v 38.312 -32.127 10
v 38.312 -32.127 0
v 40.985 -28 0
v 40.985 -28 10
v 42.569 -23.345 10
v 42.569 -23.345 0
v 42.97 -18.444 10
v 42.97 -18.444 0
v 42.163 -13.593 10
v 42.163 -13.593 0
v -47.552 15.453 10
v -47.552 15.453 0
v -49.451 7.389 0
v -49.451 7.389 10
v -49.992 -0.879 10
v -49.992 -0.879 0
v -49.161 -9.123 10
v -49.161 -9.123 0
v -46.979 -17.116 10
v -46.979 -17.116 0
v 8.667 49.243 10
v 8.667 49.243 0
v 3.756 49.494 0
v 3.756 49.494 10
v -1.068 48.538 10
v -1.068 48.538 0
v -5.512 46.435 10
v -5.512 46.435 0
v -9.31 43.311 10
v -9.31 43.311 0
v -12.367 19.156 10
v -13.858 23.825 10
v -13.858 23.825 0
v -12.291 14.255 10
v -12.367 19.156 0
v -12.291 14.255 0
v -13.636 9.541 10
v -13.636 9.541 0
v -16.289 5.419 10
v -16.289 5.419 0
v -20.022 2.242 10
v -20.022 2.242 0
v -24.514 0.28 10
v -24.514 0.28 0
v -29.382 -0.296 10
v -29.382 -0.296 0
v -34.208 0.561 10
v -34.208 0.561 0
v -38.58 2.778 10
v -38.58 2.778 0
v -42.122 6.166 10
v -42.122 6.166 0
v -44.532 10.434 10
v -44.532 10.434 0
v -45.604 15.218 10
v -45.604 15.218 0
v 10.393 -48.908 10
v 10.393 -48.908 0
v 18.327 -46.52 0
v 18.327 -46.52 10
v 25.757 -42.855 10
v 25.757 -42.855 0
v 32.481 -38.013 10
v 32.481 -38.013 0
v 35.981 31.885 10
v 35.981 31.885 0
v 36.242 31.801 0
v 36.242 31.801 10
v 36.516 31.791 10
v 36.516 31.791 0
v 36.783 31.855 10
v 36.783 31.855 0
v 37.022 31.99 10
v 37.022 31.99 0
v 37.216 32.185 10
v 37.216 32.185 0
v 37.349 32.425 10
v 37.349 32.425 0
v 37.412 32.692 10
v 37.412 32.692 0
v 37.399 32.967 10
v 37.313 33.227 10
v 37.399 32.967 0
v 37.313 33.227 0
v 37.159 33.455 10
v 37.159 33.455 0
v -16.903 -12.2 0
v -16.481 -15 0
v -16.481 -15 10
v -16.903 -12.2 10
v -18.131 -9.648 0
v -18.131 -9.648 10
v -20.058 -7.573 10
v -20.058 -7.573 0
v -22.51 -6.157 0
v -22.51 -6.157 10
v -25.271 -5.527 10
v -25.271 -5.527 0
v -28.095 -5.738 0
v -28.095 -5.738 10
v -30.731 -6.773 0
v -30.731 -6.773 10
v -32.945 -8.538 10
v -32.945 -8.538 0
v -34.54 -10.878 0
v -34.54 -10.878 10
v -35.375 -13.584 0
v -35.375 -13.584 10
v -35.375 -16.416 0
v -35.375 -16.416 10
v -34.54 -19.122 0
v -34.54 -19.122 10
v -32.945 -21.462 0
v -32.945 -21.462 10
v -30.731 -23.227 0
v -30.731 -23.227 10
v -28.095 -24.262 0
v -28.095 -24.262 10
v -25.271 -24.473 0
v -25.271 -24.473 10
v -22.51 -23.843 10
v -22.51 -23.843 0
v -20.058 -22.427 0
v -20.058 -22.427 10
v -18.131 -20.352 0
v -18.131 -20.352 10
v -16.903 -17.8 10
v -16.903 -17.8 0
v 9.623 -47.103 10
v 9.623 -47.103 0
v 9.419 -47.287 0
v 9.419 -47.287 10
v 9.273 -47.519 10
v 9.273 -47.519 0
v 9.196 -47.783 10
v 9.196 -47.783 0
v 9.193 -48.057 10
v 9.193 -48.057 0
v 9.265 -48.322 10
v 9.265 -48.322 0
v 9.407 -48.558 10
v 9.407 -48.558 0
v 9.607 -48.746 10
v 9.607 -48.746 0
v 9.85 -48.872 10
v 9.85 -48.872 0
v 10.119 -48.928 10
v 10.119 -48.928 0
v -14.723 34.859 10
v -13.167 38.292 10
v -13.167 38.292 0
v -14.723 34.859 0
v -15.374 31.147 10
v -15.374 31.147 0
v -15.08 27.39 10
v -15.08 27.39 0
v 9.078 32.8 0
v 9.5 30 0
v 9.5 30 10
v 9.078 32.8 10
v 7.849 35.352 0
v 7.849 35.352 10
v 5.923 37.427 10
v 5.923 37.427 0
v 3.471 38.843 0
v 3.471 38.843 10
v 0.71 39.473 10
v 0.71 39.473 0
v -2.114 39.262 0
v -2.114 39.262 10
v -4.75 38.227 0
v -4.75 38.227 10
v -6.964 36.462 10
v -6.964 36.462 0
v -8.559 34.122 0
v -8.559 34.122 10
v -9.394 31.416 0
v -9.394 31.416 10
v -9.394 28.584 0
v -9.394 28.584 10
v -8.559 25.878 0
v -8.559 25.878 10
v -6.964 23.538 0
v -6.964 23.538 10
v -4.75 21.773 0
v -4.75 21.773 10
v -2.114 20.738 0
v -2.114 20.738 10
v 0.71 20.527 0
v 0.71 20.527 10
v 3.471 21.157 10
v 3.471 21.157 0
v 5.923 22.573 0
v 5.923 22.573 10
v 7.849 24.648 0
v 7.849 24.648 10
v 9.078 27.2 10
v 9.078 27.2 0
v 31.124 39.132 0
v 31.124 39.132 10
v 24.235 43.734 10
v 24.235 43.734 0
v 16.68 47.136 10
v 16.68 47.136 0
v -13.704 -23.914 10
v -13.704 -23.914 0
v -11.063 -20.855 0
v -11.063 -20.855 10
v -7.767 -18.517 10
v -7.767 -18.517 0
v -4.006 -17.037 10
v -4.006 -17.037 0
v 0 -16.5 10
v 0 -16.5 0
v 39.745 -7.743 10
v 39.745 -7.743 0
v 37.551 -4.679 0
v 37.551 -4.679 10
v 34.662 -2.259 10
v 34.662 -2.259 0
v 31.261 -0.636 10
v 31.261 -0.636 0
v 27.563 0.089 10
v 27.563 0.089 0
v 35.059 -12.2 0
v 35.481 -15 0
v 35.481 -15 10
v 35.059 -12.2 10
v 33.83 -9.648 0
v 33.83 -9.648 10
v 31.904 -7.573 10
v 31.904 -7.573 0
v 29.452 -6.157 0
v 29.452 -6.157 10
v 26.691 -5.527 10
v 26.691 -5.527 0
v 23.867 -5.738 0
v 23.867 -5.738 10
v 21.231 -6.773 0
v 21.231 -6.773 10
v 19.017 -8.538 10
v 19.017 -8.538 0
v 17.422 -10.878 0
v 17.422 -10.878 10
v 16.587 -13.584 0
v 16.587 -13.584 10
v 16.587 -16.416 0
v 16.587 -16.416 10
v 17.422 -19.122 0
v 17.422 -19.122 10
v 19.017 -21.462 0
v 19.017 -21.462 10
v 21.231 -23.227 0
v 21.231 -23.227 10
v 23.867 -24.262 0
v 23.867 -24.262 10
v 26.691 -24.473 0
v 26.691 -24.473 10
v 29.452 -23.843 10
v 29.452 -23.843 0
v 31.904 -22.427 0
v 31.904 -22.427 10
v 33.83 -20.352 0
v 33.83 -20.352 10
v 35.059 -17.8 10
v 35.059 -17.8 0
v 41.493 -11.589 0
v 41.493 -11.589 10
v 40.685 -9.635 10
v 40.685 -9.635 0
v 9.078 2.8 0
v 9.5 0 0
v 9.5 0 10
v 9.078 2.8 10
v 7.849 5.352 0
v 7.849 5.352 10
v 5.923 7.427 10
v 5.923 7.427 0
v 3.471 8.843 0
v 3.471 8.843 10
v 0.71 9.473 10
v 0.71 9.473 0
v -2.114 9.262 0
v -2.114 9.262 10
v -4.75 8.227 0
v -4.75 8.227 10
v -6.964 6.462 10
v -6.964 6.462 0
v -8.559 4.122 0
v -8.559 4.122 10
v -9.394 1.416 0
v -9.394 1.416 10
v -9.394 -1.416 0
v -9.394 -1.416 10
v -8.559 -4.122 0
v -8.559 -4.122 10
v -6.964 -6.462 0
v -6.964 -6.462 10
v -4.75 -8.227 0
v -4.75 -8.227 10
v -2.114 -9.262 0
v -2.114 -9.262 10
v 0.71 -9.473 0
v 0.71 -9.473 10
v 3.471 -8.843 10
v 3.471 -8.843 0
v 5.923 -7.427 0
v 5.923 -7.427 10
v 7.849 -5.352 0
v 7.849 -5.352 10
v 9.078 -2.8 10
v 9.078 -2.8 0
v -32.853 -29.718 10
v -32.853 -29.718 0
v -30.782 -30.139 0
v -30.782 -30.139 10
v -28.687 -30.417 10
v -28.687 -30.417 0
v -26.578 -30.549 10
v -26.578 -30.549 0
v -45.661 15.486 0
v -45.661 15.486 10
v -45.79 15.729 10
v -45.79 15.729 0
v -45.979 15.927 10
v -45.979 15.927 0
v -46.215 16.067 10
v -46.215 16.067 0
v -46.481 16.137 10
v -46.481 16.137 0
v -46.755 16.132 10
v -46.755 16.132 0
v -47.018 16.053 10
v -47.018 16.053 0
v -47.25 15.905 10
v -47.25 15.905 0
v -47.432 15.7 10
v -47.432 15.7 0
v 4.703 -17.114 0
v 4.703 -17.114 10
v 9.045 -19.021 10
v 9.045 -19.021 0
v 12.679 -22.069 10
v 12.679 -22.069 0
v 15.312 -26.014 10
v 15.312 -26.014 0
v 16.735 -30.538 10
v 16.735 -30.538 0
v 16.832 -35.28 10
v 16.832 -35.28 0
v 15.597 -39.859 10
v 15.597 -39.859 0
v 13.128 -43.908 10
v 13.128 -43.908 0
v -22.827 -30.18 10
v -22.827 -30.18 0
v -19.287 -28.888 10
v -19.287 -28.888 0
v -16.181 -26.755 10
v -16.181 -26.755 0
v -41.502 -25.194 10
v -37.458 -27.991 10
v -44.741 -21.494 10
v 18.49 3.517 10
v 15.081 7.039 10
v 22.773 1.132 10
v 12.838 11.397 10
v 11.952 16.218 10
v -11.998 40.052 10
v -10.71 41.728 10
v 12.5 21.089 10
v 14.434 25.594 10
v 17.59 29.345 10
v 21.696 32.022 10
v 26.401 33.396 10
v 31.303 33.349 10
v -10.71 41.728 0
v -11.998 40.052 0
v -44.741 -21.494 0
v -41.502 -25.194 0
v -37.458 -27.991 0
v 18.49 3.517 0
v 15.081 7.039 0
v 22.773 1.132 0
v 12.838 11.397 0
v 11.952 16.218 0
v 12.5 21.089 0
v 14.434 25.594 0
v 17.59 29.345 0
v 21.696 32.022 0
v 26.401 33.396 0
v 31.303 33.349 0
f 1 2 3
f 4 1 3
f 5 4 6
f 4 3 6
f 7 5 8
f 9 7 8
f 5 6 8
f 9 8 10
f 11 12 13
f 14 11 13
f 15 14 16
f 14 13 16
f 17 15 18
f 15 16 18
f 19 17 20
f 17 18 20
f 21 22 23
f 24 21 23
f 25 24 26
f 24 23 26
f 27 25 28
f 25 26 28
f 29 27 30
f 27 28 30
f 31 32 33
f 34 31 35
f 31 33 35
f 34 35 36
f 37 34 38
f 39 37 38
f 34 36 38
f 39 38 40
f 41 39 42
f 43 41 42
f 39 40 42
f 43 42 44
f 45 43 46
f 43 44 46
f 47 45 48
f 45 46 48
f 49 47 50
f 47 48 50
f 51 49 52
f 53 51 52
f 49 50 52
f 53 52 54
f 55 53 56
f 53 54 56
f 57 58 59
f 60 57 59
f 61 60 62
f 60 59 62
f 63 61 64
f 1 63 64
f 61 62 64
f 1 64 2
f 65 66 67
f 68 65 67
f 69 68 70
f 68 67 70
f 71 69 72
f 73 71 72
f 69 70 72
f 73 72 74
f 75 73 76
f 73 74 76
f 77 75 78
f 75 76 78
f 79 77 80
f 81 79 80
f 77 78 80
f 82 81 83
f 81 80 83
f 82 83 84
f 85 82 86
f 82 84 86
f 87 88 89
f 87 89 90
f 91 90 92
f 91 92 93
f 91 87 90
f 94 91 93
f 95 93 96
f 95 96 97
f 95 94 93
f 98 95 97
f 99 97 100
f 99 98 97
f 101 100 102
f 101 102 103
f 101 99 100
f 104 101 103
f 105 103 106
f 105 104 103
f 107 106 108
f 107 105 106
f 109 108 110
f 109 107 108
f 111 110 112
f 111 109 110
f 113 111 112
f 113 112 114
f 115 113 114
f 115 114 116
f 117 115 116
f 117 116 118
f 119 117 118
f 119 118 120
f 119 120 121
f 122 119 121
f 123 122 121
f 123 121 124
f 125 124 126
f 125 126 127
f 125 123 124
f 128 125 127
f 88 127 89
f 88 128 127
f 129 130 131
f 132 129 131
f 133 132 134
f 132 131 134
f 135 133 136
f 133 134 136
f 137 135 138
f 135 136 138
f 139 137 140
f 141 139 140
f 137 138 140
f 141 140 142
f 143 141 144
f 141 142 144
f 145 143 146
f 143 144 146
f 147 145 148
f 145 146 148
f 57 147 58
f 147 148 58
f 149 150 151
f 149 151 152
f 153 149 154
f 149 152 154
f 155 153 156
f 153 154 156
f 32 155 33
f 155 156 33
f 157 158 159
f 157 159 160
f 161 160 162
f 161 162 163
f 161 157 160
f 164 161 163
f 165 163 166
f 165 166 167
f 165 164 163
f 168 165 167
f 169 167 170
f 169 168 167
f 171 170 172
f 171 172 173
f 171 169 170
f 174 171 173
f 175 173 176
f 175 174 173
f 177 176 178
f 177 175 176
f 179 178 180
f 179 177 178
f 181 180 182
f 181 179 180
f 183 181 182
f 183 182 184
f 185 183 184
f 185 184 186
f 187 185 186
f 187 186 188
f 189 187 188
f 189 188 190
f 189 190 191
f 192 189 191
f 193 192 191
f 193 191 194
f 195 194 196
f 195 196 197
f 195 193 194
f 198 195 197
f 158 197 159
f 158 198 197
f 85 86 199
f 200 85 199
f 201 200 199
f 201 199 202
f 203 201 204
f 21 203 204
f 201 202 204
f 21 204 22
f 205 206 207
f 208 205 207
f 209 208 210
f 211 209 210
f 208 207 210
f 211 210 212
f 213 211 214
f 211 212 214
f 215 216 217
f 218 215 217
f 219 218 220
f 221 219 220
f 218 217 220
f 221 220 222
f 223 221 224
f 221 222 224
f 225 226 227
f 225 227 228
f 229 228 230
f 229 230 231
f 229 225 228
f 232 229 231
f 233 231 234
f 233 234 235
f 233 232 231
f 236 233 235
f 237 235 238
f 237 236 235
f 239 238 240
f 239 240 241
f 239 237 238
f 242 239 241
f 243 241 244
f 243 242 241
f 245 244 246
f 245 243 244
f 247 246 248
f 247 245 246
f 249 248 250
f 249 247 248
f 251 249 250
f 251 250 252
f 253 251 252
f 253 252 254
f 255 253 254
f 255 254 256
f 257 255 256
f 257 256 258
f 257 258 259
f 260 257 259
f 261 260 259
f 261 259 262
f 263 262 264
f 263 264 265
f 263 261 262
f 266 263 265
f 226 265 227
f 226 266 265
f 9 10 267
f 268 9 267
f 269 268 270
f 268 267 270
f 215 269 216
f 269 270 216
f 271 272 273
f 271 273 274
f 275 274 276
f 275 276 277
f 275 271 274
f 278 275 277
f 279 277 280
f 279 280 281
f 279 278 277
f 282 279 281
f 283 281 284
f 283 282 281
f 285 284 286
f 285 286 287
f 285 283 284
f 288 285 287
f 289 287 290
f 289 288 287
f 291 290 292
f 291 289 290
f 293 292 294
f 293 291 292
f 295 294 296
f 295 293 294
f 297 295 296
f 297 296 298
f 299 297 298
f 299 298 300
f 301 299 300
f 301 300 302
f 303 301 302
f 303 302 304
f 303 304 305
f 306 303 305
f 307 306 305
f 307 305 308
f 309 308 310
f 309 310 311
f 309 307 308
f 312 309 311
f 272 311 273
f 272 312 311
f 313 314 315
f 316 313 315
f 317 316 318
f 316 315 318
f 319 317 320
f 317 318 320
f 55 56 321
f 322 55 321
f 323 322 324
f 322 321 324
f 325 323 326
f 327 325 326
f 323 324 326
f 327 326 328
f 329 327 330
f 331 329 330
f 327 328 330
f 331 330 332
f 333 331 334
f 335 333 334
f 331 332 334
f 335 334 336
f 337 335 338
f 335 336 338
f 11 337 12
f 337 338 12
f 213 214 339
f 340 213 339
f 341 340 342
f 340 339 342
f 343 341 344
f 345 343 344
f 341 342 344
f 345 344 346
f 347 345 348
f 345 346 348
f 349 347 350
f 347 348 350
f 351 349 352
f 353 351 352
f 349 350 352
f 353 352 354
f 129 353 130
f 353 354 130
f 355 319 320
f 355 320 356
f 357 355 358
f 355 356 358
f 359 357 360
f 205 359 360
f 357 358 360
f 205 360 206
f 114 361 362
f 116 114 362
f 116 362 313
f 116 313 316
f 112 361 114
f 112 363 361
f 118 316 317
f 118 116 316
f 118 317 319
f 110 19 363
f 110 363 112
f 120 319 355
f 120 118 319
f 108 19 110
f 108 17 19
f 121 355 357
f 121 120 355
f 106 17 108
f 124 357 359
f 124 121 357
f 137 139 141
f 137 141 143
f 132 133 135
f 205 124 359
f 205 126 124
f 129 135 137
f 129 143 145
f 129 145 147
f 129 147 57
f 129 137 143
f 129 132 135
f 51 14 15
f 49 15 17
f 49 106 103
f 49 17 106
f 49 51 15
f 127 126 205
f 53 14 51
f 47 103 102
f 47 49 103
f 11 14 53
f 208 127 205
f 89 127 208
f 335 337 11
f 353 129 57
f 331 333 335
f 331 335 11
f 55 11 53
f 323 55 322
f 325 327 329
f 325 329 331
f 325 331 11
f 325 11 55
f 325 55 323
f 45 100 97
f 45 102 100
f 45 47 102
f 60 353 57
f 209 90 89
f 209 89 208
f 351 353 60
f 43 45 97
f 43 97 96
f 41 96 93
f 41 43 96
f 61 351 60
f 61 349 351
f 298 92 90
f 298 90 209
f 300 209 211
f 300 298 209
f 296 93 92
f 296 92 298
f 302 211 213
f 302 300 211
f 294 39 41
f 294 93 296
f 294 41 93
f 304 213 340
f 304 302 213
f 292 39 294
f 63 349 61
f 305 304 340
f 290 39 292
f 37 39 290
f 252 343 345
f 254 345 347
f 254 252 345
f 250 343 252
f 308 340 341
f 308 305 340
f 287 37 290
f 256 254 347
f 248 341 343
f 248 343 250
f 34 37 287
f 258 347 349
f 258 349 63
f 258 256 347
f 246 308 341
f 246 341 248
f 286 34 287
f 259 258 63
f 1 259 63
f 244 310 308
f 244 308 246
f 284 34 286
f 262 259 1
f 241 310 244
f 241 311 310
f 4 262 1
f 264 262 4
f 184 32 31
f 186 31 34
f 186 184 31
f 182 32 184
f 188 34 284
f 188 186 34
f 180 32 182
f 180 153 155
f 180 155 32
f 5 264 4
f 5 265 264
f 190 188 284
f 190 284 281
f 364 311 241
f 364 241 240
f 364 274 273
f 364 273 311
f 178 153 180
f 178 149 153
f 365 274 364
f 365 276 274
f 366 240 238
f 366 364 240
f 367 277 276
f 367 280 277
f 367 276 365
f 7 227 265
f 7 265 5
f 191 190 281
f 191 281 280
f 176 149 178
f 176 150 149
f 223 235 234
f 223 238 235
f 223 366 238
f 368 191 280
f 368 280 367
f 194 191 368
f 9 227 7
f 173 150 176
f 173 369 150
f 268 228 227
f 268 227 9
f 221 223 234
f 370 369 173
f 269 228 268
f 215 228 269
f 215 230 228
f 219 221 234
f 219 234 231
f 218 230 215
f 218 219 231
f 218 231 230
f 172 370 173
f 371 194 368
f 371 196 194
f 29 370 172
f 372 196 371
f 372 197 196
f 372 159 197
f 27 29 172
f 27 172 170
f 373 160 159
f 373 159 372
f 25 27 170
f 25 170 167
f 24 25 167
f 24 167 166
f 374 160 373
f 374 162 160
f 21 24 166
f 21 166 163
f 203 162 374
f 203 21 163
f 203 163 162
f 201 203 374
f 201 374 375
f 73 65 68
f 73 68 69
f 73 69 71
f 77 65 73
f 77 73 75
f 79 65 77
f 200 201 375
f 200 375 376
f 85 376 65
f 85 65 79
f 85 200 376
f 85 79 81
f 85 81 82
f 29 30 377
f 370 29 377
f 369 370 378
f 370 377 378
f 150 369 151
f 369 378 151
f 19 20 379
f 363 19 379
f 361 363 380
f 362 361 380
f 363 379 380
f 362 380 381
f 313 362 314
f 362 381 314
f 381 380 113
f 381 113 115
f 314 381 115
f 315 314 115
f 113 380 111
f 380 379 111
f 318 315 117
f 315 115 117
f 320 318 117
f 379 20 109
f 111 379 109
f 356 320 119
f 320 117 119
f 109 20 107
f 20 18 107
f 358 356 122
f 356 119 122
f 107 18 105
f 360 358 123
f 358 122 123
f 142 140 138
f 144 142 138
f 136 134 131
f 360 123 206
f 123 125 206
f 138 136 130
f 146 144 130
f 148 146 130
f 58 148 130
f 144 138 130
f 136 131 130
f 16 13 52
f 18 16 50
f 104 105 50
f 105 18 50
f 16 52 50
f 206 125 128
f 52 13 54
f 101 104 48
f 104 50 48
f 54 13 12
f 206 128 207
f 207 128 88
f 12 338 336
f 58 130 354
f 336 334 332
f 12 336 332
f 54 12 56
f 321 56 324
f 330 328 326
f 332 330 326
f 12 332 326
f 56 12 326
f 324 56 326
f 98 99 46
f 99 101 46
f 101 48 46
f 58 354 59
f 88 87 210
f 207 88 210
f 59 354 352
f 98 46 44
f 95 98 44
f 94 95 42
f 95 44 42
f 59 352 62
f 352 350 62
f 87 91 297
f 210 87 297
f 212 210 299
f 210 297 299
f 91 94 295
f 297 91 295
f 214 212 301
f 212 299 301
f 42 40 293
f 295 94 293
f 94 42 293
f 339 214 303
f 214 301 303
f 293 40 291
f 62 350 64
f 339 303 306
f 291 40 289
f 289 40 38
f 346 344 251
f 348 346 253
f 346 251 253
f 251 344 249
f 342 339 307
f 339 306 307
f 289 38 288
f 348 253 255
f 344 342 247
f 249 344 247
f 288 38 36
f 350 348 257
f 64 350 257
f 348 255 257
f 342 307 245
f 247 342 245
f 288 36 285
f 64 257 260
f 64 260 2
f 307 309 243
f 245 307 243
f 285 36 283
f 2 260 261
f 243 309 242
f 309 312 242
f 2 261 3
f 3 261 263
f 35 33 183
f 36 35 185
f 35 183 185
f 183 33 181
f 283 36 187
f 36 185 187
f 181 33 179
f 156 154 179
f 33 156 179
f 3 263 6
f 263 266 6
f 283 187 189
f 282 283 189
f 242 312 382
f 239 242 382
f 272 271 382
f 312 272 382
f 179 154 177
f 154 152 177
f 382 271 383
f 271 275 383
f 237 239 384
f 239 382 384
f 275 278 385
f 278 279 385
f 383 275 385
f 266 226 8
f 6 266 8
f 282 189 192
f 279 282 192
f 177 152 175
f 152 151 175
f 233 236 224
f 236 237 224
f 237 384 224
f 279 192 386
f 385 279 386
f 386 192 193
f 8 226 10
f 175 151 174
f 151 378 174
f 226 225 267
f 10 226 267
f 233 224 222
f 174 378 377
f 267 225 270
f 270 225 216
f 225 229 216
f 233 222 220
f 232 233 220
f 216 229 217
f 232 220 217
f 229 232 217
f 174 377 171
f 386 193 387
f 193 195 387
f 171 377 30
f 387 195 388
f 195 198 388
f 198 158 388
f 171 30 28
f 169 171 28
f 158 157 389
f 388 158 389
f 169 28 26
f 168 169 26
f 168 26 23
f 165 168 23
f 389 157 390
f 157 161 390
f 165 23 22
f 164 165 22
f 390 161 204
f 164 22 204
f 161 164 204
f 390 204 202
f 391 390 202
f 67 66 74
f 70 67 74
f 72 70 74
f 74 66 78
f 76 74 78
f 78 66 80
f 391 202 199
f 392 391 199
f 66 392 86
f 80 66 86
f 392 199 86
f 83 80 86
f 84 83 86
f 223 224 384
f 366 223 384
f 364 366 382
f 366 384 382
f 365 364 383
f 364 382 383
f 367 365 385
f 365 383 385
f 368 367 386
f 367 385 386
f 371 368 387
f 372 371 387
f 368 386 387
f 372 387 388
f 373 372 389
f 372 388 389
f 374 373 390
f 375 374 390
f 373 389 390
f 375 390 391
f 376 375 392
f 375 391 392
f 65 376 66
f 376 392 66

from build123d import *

# Parameters (mm, degrees)
F0_R     = 9.5
F1_DEPTH = 10


with BuildPart() as f1:
    # F0 (on Top) → F1 (new body)
    with BuildSketch(Plane.XY):
        with BuildLine():
            ThreePointArc((-45.603654, 15.217773), (-46.480887, 16.137107), (-47.551994, 15.45341))
            ThreePointArc((-47.551994, 15.45341), (-49.992271, -0.879128), (-46.979256, -17.115769))
            ThreePointArc((-46.979256, -17.115769), (-41.501628, -25.193784), (-32.853296, -29.717619))
            ThreePointArc((-32.853296, -29.717619), (-29.737157, -30.296193), (-26.577854, -30.548923))
            ThreePointArc((-26.577854, -30.548923), (-19.287217, -28.888307), (-13.704095, -23.914398))
            ThreePointArc((-13.704095, -23.914398), (-7.766577, -18.516867), (0, -16.5))
            ThreePointArc((0, -16.5), (16.184433, -28.225238), (9.622849, -47.102809))
            ThreePointArc((9.622849, -47.102809), (9.265298, -48.322182), (10.392951, -48.90794))
            ThreePointArc((10.392951, -48.90794), (25.757483, -42.855012), (38.312318, -32.127345))
            ThreePointArc((38.312318, -32.127345), (42.569271, -23.344572), (42.162861, -13.592979))
            ThreePointArc((42.162861, -13.592979), (41.105851, -10.605037), (39.74507, -7.742635))
            ThreePointArc((39.74507, -7.742635), (34.661617, -2.259066), (27.562523, 0.089105))
            ThreePointArc((27.562523, 0.089105), (12.499757, 21.089495), (35.980805, 31.885036))
            ThreePointArc((35.980805, 31.885036), (37.215588, 32.185075), (37.159042, 33.45453))
            ThreePointArc((37.159042, 33.45453), (24.234788, 43.734141), (8.666937, 49.243113))
            ThreePointArc((8.666937, 49.243113), (-1.067643, 48.538356), (-9.309565, 43.310599))
            ThreePointArc((-9.309565, 43.310599), (-11.368694, 40.90123), (-13.167216, 38.291558))
            ThreePointArc((-13.167216, 38.291558), (-15.3744, 31.147374), (-13.858429, 23.825293))
            ThreePointArc((-13.858429, 23.825293), (-24.513917, 0.280359), (-45.603654, 15.217773))
        make_face()
        with Locations((-25.980762, -15)):
            Circle(F0_R, mode=Mode.SUBTRACT)
        Circle(F0_R, mode=Mode.SUBTRACT)
        with Locations((25.980762, -15)):
            Circle(F0_R, mode=Mode.SUBTRACT)
        with Locations((0, 30)):
            Circle(F0_R, mode=Mode.SUBTRACT)
    extrude(amount=F1_DEPTH)


solid = f1.part
